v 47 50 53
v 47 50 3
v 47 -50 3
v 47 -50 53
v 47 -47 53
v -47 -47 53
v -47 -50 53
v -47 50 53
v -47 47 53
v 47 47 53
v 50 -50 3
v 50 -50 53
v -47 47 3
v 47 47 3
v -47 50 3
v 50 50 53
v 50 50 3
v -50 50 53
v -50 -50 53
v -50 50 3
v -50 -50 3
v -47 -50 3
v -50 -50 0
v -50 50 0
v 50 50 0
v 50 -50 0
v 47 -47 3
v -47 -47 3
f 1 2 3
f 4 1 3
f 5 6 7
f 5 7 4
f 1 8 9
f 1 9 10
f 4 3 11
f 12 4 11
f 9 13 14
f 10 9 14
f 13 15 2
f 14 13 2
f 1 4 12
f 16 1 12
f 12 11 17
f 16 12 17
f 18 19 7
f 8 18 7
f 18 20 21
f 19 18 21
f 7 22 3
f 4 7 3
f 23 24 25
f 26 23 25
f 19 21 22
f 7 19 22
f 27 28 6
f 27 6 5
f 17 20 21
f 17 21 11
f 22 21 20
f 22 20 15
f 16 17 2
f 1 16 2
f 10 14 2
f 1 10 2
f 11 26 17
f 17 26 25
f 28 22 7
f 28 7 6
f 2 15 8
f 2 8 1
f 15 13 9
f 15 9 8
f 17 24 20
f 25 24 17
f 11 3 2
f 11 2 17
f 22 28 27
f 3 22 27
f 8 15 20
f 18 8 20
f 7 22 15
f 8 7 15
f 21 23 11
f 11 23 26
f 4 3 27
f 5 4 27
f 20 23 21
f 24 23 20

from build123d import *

# Parameters (mm, degrees)
F0_W     = 100
F0_H     = 100
F1_DEPTH = 3
F2_W     = 94
F2_H     = 3
F3_DEPTH = 50
F4_DEPTH = 50


with BuildPart() as f1:
    # F0 (on Top) → F1 (new body)
    with BuildSketch(Plane.XY):
        Rectangle(F0_W, F0_H)
    extrude(amount=F1_DEPTH)


with BuildPart() as f3:
    # F2 (on face) → F3 (new body)
    with BuildSketch(Plane.XY.offset(3)):
        with Locations((0, 48.5)):
            Rectangle(F2_W, F2_H)
        with Locations((0, -48.5)):
            Rectangle(F2_W, F2_H)
    extrude(amount=F3_DEPTH)


with BuildPart() as f4:
    # F2 (on face) → F4 (new body)
    with BuildSketch(Plane.XY.offset(3)):
        Polygon((-47, -50), (-47, -47), (-47, 47), (-47, 50), (-50, 50), (-50, -50), align=None)
        Polygon((47, 47), (47, -47), (47, -50), (50, -50), (50, 50), (47, 50), align=None)
    extrude(amount=F4_DEPTH)


solid = Compound([f1.part, f3.part, f4.part])
